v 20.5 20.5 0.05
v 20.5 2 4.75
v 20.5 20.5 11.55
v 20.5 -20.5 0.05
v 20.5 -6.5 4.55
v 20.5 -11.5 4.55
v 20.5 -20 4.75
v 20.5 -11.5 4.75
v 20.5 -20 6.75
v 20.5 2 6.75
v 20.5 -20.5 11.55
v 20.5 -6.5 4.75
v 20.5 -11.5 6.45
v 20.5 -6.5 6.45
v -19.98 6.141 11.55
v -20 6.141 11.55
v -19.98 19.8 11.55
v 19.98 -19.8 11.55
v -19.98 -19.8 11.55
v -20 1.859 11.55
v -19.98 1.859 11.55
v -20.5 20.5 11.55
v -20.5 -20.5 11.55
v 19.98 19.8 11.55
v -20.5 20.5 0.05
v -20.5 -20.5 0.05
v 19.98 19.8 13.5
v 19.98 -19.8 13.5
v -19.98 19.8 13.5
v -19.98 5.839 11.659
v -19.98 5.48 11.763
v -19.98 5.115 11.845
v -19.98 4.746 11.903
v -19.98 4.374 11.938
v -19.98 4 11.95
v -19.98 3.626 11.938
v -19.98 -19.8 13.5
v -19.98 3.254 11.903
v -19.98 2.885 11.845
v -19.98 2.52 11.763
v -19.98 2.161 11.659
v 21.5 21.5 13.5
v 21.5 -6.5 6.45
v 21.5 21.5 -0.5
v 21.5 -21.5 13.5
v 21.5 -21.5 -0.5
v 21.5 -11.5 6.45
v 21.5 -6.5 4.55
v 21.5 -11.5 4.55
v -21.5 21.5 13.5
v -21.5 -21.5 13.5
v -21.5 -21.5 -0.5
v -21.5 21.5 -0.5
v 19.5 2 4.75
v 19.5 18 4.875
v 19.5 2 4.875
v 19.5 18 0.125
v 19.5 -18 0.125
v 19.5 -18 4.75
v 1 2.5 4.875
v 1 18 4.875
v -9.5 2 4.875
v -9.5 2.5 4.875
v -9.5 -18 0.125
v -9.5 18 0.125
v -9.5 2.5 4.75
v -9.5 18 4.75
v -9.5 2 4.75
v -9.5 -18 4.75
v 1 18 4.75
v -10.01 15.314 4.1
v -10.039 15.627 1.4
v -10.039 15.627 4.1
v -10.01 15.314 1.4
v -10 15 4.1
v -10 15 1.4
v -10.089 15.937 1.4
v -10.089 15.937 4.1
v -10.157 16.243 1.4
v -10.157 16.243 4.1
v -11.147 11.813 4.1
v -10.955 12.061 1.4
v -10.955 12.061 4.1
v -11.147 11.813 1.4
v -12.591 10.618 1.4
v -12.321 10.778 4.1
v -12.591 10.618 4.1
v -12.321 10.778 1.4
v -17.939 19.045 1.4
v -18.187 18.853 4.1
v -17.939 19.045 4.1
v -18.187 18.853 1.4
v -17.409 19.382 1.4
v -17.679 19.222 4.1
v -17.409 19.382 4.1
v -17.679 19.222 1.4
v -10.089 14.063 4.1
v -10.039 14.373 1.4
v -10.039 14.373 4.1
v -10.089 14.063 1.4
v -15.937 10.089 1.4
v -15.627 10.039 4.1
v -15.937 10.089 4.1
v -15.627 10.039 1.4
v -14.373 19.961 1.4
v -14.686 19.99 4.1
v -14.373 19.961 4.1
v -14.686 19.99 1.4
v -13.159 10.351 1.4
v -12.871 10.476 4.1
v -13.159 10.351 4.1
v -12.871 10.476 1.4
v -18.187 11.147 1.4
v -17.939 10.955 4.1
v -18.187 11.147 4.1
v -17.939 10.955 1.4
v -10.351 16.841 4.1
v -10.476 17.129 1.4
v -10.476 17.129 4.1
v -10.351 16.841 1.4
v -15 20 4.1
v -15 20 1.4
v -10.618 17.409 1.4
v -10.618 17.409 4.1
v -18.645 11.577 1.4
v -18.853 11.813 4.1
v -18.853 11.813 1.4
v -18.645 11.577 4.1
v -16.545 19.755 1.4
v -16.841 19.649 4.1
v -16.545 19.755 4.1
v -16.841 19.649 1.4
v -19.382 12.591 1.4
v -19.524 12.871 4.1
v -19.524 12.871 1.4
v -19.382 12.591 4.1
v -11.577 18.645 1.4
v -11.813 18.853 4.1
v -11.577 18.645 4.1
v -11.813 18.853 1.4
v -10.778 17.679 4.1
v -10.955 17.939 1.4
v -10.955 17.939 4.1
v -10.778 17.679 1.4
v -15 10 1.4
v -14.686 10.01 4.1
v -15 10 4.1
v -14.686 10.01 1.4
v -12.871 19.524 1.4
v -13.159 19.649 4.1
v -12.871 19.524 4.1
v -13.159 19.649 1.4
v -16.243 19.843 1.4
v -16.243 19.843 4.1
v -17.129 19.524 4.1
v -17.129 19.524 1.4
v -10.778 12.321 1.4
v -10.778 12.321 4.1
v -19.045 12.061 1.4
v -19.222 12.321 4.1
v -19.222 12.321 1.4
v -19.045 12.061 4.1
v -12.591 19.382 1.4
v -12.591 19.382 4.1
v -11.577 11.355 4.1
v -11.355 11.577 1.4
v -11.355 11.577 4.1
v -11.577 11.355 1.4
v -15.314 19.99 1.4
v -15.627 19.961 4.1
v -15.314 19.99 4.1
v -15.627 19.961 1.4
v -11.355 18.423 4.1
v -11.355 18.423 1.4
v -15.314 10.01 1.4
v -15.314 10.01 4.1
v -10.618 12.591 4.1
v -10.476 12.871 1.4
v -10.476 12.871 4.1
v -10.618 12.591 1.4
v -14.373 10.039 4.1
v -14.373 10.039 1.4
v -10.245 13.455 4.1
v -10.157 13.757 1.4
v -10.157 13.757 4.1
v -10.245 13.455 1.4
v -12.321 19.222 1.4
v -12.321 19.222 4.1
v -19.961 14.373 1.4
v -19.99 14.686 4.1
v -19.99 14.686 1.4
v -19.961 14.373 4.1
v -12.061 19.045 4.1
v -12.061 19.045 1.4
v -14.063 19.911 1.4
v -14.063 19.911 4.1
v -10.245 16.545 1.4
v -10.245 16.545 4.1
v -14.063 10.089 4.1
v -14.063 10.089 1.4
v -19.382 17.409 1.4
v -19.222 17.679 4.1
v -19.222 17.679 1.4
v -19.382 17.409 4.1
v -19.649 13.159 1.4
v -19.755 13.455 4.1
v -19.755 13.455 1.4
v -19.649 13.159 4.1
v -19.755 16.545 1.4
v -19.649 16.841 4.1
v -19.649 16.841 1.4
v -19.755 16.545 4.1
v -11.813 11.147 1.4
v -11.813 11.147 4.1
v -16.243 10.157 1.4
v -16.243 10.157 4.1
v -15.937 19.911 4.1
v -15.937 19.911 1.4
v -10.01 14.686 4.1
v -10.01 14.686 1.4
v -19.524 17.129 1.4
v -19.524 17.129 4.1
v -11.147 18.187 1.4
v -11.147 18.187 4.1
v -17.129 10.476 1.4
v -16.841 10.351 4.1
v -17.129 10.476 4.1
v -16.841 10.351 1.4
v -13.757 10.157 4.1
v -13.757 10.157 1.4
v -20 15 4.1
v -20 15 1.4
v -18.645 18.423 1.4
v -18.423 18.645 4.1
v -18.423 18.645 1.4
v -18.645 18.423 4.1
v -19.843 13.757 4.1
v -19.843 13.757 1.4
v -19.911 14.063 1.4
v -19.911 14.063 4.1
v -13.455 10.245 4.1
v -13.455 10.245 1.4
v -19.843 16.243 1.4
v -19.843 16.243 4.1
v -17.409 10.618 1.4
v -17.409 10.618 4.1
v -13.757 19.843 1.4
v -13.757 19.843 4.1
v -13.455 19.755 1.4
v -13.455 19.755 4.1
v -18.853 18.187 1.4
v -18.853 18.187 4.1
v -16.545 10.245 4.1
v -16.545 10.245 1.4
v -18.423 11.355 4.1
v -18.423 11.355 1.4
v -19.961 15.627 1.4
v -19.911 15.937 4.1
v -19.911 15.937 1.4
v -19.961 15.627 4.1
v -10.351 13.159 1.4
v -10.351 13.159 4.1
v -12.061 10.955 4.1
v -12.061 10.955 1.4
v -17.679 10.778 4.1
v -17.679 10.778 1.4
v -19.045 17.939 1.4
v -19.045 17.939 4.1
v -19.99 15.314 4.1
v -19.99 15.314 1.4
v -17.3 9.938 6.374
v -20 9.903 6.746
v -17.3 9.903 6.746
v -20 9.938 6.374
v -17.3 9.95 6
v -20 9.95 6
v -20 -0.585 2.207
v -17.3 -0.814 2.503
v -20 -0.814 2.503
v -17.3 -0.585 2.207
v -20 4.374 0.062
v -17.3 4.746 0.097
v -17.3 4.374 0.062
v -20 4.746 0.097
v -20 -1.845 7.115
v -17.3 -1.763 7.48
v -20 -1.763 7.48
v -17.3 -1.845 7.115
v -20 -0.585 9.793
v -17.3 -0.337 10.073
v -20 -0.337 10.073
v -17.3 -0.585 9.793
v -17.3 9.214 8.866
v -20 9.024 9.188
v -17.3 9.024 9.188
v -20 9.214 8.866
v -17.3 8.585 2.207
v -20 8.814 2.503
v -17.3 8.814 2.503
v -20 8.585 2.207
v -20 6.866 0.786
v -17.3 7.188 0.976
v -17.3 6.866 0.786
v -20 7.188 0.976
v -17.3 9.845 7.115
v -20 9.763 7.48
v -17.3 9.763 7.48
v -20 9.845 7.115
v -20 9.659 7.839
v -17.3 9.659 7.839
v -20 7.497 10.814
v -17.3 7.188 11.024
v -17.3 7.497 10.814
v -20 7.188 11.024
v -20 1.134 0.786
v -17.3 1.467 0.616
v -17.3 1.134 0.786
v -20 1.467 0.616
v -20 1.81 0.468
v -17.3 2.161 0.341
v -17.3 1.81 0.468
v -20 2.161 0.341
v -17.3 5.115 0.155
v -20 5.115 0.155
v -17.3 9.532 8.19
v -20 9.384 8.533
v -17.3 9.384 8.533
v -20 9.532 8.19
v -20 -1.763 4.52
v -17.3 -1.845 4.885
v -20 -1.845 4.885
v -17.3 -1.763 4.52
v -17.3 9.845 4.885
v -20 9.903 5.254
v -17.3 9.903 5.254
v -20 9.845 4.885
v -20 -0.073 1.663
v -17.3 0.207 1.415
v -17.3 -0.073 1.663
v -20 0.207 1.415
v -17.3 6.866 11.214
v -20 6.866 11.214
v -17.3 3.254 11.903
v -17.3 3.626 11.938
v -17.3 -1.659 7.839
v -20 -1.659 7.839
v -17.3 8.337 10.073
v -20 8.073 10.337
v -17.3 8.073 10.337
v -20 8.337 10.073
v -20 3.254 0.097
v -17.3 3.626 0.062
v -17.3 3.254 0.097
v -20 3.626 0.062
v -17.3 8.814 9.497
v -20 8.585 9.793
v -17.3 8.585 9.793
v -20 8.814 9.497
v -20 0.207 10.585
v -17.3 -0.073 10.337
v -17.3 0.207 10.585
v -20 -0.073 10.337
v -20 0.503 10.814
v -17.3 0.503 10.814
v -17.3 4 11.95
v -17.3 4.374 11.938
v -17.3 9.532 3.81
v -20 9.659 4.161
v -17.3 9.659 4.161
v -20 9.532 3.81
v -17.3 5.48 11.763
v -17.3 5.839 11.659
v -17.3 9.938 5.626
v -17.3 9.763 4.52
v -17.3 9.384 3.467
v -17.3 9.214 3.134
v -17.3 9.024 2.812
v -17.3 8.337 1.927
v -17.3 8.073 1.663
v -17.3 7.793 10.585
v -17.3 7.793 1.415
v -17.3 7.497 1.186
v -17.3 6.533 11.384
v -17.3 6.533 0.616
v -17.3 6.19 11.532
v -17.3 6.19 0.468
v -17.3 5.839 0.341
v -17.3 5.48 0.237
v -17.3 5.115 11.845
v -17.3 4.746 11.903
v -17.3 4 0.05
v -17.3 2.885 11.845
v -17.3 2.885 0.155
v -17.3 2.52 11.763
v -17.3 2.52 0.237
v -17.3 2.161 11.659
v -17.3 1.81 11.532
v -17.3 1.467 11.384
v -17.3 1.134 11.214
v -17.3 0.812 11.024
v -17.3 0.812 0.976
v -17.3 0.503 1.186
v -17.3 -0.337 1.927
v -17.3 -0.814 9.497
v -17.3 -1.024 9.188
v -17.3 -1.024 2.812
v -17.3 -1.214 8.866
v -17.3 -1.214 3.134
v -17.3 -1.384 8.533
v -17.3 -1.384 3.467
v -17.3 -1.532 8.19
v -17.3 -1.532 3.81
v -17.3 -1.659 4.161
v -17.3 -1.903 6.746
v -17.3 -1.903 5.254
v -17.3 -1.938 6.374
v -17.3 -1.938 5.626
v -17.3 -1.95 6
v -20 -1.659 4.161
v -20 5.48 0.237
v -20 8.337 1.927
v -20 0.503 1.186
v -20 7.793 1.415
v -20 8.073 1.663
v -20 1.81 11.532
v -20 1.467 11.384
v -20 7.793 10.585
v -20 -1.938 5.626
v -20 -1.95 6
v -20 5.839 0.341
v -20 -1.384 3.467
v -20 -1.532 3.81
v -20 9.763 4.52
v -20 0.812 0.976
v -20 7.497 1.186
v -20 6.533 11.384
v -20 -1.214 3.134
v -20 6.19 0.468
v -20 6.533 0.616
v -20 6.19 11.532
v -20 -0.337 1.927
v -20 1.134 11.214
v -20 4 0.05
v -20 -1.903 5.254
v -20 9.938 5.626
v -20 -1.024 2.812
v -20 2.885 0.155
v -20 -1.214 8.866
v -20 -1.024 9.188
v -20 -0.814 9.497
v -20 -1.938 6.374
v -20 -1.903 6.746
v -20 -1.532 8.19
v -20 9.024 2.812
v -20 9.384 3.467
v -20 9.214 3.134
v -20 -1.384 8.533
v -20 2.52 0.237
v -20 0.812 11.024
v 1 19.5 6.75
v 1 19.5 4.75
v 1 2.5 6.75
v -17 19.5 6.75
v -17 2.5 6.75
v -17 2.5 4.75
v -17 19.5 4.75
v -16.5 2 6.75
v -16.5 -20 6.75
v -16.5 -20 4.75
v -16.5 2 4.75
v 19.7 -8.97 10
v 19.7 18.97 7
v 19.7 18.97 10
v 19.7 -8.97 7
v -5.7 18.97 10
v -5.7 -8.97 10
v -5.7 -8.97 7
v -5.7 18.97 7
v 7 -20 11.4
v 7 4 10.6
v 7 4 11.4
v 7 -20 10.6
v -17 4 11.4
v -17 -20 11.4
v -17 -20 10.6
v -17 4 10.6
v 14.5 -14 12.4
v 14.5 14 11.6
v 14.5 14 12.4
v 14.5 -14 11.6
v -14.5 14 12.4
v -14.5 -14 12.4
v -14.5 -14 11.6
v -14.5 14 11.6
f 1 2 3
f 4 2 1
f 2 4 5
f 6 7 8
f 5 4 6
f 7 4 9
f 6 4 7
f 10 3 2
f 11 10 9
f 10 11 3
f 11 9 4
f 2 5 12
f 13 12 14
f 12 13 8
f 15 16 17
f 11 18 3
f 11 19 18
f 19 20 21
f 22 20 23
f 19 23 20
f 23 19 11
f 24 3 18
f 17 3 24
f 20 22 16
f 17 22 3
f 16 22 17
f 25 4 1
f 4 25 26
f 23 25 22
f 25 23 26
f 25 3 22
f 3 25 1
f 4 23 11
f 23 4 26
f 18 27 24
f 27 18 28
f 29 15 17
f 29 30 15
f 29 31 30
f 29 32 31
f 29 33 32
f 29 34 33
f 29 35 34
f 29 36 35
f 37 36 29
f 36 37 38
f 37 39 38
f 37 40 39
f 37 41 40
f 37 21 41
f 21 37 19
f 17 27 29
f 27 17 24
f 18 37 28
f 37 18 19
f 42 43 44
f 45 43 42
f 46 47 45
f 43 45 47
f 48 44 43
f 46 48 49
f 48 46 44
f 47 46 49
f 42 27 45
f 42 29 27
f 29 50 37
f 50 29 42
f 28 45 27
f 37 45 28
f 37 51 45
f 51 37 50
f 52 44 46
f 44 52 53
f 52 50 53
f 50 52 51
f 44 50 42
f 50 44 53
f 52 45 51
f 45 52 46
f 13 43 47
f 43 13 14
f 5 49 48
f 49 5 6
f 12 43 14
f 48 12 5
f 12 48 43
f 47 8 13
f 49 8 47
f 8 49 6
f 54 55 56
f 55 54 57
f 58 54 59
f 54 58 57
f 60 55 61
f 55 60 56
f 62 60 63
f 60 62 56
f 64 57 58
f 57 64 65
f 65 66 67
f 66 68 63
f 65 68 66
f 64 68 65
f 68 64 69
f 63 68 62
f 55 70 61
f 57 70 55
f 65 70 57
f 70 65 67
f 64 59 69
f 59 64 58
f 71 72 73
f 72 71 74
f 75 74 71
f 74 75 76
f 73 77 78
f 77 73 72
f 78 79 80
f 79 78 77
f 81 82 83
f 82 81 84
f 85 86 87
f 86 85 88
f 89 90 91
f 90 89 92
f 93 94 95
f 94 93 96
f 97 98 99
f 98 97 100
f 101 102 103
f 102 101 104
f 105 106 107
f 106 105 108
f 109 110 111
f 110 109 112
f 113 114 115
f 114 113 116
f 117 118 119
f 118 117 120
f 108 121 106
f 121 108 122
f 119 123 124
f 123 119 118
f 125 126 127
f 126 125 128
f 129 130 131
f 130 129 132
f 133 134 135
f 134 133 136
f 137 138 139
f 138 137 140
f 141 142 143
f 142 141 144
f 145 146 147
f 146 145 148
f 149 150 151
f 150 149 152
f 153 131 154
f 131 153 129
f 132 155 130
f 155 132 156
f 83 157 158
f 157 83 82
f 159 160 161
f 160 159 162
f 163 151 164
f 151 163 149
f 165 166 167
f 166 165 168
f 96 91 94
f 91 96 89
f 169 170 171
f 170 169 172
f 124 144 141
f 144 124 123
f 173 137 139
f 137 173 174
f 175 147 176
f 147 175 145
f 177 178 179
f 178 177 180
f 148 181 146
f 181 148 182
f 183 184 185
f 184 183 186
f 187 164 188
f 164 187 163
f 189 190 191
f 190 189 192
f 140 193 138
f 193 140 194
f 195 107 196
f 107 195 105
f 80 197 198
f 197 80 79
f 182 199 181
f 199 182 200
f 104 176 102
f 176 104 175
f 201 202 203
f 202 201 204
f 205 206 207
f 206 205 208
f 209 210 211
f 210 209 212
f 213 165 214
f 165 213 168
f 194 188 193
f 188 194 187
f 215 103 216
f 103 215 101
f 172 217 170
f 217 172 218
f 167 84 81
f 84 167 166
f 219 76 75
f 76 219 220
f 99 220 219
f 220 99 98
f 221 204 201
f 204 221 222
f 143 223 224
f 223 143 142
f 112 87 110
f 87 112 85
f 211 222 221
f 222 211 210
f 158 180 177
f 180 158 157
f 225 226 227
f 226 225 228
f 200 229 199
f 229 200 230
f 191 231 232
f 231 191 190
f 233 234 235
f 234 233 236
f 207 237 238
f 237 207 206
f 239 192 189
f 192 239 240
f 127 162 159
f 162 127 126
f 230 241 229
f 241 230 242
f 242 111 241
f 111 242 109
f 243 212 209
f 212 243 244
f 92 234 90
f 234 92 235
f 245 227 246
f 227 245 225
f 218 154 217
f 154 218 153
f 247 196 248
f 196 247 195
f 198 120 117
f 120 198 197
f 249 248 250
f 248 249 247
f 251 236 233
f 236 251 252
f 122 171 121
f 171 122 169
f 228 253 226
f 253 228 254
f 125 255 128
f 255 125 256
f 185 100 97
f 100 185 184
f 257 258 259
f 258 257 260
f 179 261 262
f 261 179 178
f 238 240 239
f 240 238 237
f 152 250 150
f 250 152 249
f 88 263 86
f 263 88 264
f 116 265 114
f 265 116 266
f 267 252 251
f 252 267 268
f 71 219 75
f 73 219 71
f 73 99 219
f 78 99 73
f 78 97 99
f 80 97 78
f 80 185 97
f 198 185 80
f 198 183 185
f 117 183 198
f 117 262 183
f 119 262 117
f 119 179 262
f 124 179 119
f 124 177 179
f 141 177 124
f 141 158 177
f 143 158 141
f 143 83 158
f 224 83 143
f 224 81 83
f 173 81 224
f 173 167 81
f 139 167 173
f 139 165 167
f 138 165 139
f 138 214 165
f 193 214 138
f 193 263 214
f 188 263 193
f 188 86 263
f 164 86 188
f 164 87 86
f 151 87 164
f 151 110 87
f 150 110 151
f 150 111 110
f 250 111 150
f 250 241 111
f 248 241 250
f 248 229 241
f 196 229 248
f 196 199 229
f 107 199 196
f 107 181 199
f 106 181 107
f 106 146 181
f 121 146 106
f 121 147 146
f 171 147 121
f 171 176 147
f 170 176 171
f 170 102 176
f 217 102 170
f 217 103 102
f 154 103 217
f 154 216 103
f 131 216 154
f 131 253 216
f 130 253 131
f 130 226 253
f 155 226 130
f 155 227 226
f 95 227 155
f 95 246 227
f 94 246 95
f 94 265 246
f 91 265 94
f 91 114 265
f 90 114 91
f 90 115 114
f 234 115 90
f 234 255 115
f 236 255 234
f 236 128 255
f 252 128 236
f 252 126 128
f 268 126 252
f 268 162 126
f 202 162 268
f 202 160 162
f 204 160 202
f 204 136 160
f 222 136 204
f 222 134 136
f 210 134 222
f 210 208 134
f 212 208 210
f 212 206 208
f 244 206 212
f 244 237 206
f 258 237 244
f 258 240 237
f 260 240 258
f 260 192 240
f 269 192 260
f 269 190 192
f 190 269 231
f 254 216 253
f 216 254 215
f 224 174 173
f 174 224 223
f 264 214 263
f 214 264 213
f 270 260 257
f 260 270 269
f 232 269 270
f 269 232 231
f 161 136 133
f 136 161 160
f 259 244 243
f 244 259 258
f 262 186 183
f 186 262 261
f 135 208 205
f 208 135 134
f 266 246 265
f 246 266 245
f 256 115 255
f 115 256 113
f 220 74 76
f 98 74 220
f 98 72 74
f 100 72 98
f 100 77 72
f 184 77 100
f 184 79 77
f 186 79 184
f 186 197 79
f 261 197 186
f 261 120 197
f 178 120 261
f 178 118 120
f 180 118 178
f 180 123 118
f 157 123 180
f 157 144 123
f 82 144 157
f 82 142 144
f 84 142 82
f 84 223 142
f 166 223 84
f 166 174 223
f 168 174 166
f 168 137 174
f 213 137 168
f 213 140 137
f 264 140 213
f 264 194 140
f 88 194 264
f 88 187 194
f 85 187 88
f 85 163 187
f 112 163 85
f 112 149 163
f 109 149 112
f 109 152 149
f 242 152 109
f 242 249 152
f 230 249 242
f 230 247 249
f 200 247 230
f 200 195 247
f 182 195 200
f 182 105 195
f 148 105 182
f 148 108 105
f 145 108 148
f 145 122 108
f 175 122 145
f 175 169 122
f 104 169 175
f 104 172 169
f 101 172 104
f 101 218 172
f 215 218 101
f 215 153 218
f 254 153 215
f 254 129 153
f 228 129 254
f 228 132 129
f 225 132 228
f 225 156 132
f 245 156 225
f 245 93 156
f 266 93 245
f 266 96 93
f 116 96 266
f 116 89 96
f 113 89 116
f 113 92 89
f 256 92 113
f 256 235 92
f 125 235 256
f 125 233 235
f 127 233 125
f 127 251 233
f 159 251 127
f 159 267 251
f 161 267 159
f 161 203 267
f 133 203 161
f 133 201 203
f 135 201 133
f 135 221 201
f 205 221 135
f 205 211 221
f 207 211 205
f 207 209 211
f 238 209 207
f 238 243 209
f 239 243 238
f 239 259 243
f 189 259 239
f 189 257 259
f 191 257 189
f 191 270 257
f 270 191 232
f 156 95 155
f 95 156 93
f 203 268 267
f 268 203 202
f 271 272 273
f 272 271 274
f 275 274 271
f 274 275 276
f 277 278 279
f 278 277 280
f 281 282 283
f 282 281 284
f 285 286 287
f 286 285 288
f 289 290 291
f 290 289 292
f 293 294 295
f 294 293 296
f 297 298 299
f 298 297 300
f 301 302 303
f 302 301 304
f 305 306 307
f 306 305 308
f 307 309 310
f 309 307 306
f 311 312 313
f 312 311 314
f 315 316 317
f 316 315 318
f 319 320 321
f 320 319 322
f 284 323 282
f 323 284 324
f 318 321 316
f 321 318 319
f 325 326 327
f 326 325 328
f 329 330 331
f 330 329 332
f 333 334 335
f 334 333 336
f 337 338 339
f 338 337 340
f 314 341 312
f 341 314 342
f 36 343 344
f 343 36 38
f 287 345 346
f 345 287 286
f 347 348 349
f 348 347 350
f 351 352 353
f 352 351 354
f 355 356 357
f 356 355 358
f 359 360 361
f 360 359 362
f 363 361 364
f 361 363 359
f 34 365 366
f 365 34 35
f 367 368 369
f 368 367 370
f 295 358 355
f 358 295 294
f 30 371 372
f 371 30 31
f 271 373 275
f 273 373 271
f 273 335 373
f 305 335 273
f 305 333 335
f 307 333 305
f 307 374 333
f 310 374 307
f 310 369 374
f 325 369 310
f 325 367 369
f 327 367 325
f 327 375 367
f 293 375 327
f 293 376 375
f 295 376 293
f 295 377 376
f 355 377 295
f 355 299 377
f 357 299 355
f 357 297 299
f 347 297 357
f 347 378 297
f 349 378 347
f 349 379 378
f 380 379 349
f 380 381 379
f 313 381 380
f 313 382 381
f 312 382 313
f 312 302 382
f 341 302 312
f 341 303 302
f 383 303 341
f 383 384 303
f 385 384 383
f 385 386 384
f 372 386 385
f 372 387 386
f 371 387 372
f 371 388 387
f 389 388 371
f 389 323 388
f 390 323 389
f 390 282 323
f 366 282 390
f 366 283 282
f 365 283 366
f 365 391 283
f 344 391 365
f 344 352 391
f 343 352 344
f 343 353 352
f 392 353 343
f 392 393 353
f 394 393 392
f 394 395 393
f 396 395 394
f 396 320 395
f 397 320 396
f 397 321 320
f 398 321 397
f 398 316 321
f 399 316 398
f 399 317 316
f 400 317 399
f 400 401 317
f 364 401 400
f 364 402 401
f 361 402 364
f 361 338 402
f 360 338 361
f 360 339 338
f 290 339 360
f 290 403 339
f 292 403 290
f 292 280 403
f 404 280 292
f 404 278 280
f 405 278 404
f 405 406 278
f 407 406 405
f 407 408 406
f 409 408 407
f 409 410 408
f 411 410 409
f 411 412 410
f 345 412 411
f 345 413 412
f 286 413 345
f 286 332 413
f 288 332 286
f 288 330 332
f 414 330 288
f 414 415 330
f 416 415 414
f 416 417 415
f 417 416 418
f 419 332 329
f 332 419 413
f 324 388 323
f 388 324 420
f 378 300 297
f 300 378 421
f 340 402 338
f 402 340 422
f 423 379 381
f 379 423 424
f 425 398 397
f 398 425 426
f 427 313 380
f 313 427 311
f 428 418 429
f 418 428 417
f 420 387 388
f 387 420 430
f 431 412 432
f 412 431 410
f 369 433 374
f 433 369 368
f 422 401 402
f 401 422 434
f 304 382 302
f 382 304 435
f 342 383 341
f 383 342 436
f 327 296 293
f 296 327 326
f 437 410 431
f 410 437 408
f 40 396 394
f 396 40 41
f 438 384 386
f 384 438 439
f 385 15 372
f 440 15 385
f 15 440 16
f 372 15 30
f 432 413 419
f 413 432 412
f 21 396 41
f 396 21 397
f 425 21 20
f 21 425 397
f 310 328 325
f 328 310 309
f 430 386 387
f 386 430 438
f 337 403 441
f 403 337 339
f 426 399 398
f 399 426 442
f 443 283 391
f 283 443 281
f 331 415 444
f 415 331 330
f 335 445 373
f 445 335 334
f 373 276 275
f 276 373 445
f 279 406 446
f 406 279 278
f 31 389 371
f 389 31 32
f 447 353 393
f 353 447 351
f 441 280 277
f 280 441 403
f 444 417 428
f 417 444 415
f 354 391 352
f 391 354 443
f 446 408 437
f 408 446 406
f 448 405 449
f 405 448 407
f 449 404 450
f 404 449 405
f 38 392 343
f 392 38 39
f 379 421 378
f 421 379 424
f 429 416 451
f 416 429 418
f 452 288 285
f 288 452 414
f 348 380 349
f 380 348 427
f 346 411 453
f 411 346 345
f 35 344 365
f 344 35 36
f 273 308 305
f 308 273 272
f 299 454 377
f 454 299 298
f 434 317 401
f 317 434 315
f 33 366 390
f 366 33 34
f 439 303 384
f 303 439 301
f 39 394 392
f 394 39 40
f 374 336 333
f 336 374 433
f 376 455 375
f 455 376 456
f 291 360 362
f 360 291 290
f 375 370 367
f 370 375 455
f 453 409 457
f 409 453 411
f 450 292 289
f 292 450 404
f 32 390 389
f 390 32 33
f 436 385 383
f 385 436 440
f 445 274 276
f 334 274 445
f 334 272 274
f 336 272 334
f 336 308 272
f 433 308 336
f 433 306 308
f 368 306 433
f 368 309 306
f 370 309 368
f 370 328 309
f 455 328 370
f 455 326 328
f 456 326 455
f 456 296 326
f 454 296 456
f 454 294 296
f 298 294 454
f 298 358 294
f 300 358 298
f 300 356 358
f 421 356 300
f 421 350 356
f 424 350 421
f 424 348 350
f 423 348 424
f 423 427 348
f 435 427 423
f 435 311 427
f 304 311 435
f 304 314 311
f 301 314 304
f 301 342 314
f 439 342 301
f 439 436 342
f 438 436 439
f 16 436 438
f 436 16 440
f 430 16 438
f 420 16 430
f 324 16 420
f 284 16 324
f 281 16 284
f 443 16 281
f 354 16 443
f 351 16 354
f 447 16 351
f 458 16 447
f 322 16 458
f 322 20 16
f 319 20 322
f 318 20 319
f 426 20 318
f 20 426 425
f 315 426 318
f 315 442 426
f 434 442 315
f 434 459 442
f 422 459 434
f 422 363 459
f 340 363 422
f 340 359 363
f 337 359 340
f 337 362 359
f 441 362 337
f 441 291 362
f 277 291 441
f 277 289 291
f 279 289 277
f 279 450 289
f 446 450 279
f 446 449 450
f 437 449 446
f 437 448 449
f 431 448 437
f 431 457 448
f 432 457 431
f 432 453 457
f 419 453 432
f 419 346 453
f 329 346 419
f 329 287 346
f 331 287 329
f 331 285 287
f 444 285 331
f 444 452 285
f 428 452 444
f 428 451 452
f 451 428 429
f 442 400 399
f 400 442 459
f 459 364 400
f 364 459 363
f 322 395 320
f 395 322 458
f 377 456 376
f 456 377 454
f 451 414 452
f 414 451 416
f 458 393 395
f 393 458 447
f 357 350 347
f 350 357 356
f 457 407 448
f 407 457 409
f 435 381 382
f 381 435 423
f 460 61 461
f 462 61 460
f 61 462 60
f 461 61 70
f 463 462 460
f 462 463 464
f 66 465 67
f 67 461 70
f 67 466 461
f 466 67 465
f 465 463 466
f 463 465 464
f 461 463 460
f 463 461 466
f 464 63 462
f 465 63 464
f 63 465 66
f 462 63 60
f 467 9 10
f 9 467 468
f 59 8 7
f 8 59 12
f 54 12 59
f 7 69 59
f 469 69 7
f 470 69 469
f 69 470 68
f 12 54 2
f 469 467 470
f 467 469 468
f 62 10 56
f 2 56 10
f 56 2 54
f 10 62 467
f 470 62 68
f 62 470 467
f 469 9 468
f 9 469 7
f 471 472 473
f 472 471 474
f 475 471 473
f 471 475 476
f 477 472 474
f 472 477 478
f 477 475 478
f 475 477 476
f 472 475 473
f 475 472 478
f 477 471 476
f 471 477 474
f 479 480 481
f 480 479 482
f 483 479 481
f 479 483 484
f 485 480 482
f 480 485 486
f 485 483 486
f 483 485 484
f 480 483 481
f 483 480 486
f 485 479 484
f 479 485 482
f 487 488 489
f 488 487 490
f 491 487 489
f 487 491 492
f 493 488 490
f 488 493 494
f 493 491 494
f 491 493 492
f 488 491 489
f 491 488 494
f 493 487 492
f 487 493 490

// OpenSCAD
module case1(){
    translate([0,0,6.5]){
        cube([43,43,14],true);
    }
}
module case2(){
    translate([0,0,5.8]){
        cube([41,41,11.5],true);
    }
    translate([0,0,7.5]){
        cube([39.96,39.6,13],true);
    }
}
module battery() {
    translate([5,0,2.5]){
        cube([29,36,4.75],true);
    }
}
module vibrator() {
    translate([-15,15,1.4]){
        cylinder(2.7,d1=10,d2=10,true,$fn=100);
    }
}
module buzzer() {
    translate([4,6,-20]){
        //     Y,Z,X
        cylinder(2.7,d1=11.9,d2=11.9,true,$fn=100);
    }
}
module haptic() {
    cube([18,17,2],true);
}
module boostWCharge() {
    cube([37,22,2],true);
}
module microduino() {
    cube([25.4,27.94,3],true);
}
module ble() {
    cube([29,28,.8],true);
}
module axelMagn() {
    cube([24,24,.8],true);
}
module chargePort() {
    translate([20,-9,5.5]) {
        cube([6.9,5,1.9],true);
    }
}
module caseNCharge() {
    difference() {
        color([.1,.1,.1]) case1();
        color([1,1,1]) case2();
    }
}
module case() {
    difference() {
       caseNCharge();
       color([.8,.8,.8]) chargePort();
    }
} 





case();
color([.1,.3,.1]) battery();
vibrator();
rotate([90,0,90]) buzzer();
translate([-8,11,5.75]) color([.2,.2,.8]) haptic();
translate([2,-9,5.75]) color([.2,.2,.8]) boostWCharge();
translate([7,5,8.5]) microduino();
translate([-5,-8,11]) color([.2,.1,.75]) axelMagn();
translate([0,0,12]) color([.2,.1,.75]) ble();
